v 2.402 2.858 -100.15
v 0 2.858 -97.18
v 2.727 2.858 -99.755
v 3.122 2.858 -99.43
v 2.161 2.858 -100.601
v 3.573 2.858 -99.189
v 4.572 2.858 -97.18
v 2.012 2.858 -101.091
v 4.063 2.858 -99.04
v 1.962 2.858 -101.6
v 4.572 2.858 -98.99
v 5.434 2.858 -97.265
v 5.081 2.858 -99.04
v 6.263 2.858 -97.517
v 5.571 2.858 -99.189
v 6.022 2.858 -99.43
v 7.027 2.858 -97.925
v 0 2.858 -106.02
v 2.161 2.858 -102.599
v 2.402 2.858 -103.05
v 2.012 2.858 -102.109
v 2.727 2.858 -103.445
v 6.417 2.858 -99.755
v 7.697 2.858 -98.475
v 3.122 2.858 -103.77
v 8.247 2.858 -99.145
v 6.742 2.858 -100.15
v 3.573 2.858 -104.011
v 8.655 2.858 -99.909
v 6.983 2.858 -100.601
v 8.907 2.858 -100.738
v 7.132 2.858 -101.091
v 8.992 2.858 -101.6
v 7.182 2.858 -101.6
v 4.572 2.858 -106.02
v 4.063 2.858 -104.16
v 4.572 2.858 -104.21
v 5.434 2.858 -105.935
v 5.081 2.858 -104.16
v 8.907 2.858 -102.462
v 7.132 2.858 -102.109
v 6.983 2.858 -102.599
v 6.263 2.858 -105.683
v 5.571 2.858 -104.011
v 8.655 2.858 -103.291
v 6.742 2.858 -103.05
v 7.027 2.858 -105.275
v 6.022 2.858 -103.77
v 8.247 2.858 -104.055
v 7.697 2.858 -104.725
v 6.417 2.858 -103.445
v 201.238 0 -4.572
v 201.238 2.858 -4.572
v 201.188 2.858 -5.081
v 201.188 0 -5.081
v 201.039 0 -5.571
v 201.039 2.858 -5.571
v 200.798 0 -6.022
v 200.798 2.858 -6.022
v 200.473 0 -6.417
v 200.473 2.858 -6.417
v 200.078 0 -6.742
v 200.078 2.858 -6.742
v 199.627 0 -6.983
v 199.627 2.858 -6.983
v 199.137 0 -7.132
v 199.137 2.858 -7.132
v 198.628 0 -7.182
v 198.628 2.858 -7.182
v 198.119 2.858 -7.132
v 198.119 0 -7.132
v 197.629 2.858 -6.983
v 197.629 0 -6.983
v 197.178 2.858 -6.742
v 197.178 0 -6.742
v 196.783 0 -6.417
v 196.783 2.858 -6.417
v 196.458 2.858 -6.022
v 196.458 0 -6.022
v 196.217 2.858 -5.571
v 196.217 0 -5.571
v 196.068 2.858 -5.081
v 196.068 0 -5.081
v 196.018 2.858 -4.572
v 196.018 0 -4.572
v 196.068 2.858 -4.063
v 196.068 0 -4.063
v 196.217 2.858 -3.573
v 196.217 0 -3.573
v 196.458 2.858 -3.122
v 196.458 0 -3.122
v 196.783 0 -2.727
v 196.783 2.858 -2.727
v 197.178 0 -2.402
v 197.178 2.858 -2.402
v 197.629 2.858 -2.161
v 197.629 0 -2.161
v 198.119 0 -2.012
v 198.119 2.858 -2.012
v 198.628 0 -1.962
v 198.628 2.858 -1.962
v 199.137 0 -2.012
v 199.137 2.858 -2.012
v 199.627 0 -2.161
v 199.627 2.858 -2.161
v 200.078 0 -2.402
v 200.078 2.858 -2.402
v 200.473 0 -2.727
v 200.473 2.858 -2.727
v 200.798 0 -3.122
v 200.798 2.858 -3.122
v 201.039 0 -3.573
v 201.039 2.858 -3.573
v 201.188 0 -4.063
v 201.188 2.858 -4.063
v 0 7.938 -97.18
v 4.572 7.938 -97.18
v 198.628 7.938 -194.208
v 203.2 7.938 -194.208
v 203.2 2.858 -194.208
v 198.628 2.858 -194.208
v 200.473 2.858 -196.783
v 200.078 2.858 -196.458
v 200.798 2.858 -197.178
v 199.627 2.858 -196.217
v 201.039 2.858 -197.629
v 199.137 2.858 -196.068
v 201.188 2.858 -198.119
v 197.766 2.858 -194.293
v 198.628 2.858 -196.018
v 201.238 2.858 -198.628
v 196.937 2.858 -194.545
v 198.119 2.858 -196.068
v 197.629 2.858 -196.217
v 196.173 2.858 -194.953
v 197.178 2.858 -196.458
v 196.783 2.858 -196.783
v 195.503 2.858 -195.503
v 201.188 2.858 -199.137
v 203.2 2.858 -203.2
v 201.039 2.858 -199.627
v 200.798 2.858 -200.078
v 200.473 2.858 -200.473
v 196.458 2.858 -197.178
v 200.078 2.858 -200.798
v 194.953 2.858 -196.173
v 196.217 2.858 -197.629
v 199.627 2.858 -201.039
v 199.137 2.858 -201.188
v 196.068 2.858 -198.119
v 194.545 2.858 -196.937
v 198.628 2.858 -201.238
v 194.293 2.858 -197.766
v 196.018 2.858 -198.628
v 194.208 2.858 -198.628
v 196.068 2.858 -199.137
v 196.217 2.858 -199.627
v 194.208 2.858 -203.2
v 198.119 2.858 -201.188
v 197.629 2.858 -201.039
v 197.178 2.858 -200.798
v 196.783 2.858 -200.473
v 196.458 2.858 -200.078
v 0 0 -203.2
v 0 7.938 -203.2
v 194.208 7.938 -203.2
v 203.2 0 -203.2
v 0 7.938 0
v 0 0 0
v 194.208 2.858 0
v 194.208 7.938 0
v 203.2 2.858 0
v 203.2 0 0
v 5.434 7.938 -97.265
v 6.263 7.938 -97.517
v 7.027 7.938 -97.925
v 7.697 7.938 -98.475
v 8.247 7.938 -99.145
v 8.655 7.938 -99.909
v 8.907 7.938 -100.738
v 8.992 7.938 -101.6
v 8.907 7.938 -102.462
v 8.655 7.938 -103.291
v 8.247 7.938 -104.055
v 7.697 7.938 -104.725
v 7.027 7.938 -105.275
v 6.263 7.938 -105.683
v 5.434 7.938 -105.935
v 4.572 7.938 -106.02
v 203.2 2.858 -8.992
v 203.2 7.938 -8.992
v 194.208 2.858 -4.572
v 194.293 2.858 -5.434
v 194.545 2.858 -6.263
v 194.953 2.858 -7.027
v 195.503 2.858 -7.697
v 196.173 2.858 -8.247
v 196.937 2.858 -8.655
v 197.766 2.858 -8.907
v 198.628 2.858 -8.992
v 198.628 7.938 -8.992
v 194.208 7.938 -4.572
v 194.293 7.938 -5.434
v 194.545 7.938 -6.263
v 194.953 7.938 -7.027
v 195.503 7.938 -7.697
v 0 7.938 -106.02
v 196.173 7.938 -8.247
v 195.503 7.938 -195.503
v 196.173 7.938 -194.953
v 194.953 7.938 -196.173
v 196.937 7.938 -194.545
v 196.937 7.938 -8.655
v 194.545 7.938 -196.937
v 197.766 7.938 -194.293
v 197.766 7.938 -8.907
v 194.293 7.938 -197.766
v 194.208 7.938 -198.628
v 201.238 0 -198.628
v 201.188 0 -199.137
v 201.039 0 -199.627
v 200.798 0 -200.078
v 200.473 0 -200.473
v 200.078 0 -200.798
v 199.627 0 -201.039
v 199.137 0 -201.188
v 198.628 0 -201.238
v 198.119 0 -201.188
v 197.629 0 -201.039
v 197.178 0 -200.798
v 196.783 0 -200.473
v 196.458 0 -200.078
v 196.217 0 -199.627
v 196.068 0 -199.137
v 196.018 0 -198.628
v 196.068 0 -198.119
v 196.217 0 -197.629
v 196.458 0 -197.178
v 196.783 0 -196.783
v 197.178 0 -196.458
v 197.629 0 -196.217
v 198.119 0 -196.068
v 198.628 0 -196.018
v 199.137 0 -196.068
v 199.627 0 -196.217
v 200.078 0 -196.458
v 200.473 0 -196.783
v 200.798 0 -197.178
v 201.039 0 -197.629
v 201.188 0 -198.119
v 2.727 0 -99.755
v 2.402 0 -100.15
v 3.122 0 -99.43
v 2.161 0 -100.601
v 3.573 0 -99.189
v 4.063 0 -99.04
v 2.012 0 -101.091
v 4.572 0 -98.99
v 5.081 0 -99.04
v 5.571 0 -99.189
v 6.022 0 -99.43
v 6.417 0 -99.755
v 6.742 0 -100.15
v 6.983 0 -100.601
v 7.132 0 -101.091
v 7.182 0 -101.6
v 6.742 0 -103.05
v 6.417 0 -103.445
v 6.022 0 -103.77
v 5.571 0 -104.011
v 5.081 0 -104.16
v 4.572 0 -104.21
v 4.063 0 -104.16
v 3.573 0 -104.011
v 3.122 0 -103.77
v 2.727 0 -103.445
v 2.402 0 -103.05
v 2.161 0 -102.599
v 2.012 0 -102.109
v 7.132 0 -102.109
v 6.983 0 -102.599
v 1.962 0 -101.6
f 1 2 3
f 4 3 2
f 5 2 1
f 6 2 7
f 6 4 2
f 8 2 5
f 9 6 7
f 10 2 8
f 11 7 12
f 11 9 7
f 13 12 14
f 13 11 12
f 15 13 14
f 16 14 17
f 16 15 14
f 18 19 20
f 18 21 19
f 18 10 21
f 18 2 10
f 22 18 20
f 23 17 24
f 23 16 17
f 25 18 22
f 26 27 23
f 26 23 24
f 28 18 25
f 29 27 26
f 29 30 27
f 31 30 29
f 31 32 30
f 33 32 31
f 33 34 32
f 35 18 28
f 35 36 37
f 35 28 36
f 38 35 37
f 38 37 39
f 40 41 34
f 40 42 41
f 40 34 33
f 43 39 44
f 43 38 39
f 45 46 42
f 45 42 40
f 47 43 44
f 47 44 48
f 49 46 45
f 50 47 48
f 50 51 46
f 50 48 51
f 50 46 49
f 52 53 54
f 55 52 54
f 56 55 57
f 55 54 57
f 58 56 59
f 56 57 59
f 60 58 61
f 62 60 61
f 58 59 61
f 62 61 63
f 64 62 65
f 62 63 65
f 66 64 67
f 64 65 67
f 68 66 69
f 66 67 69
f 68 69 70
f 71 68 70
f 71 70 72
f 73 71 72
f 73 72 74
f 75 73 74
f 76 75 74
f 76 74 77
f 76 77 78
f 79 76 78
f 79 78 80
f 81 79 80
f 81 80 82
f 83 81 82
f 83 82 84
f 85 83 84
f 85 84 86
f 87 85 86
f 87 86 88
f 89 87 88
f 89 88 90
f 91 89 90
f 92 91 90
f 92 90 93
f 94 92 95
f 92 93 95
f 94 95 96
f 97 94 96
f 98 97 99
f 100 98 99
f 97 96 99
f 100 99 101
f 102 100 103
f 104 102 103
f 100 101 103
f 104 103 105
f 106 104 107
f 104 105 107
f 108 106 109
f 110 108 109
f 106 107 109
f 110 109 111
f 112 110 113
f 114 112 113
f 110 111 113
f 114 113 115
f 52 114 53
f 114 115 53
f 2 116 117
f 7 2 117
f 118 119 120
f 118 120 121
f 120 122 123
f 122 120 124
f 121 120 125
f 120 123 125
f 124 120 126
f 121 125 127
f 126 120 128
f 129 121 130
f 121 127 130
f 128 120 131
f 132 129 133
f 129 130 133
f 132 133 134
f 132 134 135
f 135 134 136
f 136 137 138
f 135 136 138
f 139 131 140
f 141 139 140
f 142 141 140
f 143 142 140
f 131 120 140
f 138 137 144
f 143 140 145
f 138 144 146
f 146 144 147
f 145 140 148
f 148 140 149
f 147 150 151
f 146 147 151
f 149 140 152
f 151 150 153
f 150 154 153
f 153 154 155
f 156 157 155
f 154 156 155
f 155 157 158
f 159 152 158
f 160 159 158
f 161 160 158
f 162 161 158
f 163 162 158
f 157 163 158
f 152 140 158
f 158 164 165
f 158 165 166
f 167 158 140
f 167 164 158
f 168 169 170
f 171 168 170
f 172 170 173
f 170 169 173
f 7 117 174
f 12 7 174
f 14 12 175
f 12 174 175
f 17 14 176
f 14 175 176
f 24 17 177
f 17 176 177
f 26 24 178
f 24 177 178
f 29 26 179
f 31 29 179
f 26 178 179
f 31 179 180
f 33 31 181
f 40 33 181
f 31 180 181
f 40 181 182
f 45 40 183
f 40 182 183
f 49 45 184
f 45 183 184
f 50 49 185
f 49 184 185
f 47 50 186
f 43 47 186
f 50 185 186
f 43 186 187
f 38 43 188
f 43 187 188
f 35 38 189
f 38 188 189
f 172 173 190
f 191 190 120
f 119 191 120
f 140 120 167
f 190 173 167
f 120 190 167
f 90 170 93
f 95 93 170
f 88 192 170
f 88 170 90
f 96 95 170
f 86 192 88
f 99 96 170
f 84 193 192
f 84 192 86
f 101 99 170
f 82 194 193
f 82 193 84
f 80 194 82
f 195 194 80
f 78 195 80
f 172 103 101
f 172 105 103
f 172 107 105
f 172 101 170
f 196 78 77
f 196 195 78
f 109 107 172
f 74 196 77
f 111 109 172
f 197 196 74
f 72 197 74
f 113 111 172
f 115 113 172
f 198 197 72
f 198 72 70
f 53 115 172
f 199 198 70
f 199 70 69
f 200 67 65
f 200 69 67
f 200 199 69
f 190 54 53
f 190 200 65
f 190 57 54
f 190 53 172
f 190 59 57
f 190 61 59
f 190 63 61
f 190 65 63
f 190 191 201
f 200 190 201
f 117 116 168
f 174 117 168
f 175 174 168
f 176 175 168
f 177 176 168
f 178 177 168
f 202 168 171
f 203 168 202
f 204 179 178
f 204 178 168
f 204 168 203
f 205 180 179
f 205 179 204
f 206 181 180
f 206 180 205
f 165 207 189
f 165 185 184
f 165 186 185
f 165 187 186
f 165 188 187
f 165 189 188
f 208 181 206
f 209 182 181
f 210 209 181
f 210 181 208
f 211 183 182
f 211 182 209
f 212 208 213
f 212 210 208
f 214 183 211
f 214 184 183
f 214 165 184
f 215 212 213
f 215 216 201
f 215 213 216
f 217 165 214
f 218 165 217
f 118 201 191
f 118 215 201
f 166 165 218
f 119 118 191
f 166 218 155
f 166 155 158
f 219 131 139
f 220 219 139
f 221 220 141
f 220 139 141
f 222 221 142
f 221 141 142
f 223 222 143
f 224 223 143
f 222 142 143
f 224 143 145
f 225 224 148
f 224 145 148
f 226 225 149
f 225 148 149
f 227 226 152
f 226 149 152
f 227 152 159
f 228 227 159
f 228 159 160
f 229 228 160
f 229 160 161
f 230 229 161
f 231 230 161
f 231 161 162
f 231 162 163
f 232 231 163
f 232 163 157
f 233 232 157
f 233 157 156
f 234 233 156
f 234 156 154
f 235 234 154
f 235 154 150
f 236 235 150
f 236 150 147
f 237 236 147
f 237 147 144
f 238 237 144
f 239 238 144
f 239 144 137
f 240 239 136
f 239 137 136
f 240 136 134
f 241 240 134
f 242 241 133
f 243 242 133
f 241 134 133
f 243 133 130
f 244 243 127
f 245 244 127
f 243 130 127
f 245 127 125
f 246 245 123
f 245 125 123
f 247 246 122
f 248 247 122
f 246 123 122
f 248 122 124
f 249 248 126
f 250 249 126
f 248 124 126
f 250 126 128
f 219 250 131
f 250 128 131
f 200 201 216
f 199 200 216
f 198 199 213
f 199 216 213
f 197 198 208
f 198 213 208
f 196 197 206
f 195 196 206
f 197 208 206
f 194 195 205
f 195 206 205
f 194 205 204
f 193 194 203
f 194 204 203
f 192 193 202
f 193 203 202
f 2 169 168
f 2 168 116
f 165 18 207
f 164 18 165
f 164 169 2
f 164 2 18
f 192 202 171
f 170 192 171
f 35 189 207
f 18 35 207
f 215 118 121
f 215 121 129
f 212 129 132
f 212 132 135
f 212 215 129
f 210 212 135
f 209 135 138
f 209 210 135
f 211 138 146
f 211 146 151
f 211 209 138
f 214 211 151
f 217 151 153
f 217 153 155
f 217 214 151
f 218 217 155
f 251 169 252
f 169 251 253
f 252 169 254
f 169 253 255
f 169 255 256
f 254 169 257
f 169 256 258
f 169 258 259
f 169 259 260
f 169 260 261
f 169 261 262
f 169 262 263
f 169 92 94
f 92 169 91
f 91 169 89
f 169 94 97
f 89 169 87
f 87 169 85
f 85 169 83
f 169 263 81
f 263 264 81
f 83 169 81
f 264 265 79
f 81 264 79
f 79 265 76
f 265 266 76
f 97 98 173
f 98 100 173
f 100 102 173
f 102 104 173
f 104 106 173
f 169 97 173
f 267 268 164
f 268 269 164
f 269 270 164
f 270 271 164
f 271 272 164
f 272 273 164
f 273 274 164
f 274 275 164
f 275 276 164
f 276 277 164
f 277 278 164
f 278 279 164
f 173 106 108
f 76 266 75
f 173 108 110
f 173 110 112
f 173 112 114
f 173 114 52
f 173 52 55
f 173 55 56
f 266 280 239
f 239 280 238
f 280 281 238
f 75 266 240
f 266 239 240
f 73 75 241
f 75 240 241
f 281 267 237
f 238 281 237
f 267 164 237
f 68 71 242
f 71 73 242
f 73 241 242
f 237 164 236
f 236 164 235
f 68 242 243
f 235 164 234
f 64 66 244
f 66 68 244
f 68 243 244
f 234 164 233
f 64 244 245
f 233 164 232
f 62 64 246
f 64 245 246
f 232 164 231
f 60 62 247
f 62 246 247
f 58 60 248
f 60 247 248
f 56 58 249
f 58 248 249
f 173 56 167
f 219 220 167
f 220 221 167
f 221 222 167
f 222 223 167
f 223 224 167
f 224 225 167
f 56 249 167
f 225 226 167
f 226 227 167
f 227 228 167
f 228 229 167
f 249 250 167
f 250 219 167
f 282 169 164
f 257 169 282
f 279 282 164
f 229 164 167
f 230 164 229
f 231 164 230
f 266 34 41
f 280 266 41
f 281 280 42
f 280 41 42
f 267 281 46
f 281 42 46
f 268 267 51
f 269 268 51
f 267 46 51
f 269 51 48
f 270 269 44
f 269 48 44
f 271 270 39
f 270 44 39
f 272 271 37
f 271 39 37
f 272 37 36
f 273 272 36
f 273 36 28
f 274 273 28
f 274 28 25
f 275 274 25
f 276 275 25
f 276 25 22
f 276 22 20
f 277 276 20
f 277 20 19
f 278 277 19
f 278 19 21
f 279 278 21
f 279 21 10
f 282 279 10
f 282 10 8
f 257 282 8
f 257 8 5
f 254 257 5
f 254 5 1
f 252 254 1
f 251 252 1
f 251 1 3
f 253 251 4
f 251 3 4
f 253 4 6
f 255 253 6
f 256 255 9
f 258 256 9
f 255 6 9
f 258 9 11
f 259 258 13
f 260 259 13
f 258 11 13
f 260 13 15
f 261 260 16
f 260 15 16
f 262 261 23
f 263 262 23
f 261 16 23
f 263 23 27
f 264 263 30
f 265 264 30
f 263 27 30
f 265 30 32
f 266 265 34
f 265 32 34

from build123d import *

# Parameters (mm, degrees)
SKETCH1_W           = 203.2
SKETCH1_H           = 203.2
BOSS_EXTRUDE1_DEPTH = 7.9375
HOLES_REACH         = 9.938
SKETCH3_R           = 2.60985
SKETCH4_R           = 2.60985
COUNTERS_DEPTH      = 5.08


with BuildPart() as part:
    # Sketch1 → Boss-Extrude1 (new body)
    with BuildSketch(Plane(origin=(0, 0, 0), x_dir=(1, 0, 0), z_dir=(0, 1, 0))):
        with Locations((101.6, 101.6)):
            Rectangle(SKETCH1_W, SKETCH1_H)
    extrude(amount=BOSS_EXTRUDE1_DEPTH)

    # Sketch3 → holes (cut, up to next)
    with BuildSketch(Plane(origin=(0, 7.9375, 0), x_dir=(1, 0, 0), z_dir=(0, 1, 0)), mode=Mode.PRIVATE) as holes_sk1:
        with Locations((4.572, 101.6)):
            Circle(SKETCH3_R)
    holes_tool1 = extrude(holes_sk1.sketch, amount=-HOLES_REACH, mode=Mode.PRIVATE) & part.part
    add(holes_tool1.solids().sort_by_distance((4.572, 7.9375, -101.6))[0], mode=Mode.SUBTRACT)
    # Sketch3 → holes (cut, up to next)
    with BuildSketch(Plane(origin=(0, 7.9375, 0), x_dir=(1, 0, 0), z_dir=(0, 1, 0)), mode=Mode.PRIVATE) as holes_sk2:
        with Locations((198.628, 198.628)):
            Circle(SKETCH3_R)
    holes_tool2 = extrude(holes_sk2.sketch, amount=-HOLES_REACH, mode=Mode.PRIVATE) & part.part
    add(holes_tool2.solids().sort_by_distance((198.628, 7.9375, -198.628))[0], mode=Mode.SUBTRACT)
    # Sketch3 → holes (cut, up to next)
    with BuildSketch(Plane(origin=(0, 7.9375, 0), x_dir=(1, 0, 0), z_dir=(0, 1, 0)), mode=Mode.PRIVATE) as holes_sk3:
        with Locations((198.628, 4.572)):
            Circle(SKETCH3_R)
    holes_tool3 = extrude(holes_sk3.sketch, amount=-HOLES_REACH, mode=Mode.PRIVATE) & part.part
    add(holes_tool3.solids().sort_by_distance((198.628, 7.9375, -4.572))[0], mode=Mode.SUBTRACT)

    # Sketch4 → counters (cut)
    with BuildSketch(Plane(origin=(0, 7.9375, 0), x_dir=(1, 0, 0), z_dir=(0, 1, 0))):
        with BuildLine():
            Line((4.572, 106.0196), (0, 106.0196))
            Line((0, 106.0196), (0, 97.1804))
            Line((0, 97.1804), (4.572, 97.1804))
            ThreePointArc((4.572, 97.1804), (8.9916, 101.6), (4.572, 106.0196))
        make_face()
        with Locations((4.572, 101.6)):
            Circle(SKETCH4_R, mode=Mode.SUBTRACT)
        with BuildLine():
            Line((194.2084, 198.628), (194.2084, 203.2))
            Line((194.2084, 203.2), (203.2, 203.2))
            Line((203.2, 203.2), (203.2, 194.2084))
            Line((203.2, 194.2084), (198.628, 194.2084))
            ThreePointArc((198.628, 194.2084), (195.50287087, 195.50287087), (194.2084, 198.628))
        make_face()
        with Locations((198.628, 198.628)):
            Circle(SKETCH4_R, mode=Mode.SUBTRACT)
        with BuildLine():
            Line((194.2084, 4.572), (194.2084, 0))
            Line((194.2084, 0), (203.2, 0))
            Line((203.2, 0), (203.2, 8.9916))
            Line((203.2, 8.9916), (198.628, 8.9916))
            ThreePointArc((198.628, 8.9916), (195.50287087, 7.69712913), (194.2084, 4.572))
        make_face()
        with Locations((198.628, 4.572)):
            Circle(SKETCH4_R, mode=Mode.SUBTRACT)
    extrude(amount=-COUNTERS_DEPTH, mode=Mode.SUBTRACT)


solid = part.part
